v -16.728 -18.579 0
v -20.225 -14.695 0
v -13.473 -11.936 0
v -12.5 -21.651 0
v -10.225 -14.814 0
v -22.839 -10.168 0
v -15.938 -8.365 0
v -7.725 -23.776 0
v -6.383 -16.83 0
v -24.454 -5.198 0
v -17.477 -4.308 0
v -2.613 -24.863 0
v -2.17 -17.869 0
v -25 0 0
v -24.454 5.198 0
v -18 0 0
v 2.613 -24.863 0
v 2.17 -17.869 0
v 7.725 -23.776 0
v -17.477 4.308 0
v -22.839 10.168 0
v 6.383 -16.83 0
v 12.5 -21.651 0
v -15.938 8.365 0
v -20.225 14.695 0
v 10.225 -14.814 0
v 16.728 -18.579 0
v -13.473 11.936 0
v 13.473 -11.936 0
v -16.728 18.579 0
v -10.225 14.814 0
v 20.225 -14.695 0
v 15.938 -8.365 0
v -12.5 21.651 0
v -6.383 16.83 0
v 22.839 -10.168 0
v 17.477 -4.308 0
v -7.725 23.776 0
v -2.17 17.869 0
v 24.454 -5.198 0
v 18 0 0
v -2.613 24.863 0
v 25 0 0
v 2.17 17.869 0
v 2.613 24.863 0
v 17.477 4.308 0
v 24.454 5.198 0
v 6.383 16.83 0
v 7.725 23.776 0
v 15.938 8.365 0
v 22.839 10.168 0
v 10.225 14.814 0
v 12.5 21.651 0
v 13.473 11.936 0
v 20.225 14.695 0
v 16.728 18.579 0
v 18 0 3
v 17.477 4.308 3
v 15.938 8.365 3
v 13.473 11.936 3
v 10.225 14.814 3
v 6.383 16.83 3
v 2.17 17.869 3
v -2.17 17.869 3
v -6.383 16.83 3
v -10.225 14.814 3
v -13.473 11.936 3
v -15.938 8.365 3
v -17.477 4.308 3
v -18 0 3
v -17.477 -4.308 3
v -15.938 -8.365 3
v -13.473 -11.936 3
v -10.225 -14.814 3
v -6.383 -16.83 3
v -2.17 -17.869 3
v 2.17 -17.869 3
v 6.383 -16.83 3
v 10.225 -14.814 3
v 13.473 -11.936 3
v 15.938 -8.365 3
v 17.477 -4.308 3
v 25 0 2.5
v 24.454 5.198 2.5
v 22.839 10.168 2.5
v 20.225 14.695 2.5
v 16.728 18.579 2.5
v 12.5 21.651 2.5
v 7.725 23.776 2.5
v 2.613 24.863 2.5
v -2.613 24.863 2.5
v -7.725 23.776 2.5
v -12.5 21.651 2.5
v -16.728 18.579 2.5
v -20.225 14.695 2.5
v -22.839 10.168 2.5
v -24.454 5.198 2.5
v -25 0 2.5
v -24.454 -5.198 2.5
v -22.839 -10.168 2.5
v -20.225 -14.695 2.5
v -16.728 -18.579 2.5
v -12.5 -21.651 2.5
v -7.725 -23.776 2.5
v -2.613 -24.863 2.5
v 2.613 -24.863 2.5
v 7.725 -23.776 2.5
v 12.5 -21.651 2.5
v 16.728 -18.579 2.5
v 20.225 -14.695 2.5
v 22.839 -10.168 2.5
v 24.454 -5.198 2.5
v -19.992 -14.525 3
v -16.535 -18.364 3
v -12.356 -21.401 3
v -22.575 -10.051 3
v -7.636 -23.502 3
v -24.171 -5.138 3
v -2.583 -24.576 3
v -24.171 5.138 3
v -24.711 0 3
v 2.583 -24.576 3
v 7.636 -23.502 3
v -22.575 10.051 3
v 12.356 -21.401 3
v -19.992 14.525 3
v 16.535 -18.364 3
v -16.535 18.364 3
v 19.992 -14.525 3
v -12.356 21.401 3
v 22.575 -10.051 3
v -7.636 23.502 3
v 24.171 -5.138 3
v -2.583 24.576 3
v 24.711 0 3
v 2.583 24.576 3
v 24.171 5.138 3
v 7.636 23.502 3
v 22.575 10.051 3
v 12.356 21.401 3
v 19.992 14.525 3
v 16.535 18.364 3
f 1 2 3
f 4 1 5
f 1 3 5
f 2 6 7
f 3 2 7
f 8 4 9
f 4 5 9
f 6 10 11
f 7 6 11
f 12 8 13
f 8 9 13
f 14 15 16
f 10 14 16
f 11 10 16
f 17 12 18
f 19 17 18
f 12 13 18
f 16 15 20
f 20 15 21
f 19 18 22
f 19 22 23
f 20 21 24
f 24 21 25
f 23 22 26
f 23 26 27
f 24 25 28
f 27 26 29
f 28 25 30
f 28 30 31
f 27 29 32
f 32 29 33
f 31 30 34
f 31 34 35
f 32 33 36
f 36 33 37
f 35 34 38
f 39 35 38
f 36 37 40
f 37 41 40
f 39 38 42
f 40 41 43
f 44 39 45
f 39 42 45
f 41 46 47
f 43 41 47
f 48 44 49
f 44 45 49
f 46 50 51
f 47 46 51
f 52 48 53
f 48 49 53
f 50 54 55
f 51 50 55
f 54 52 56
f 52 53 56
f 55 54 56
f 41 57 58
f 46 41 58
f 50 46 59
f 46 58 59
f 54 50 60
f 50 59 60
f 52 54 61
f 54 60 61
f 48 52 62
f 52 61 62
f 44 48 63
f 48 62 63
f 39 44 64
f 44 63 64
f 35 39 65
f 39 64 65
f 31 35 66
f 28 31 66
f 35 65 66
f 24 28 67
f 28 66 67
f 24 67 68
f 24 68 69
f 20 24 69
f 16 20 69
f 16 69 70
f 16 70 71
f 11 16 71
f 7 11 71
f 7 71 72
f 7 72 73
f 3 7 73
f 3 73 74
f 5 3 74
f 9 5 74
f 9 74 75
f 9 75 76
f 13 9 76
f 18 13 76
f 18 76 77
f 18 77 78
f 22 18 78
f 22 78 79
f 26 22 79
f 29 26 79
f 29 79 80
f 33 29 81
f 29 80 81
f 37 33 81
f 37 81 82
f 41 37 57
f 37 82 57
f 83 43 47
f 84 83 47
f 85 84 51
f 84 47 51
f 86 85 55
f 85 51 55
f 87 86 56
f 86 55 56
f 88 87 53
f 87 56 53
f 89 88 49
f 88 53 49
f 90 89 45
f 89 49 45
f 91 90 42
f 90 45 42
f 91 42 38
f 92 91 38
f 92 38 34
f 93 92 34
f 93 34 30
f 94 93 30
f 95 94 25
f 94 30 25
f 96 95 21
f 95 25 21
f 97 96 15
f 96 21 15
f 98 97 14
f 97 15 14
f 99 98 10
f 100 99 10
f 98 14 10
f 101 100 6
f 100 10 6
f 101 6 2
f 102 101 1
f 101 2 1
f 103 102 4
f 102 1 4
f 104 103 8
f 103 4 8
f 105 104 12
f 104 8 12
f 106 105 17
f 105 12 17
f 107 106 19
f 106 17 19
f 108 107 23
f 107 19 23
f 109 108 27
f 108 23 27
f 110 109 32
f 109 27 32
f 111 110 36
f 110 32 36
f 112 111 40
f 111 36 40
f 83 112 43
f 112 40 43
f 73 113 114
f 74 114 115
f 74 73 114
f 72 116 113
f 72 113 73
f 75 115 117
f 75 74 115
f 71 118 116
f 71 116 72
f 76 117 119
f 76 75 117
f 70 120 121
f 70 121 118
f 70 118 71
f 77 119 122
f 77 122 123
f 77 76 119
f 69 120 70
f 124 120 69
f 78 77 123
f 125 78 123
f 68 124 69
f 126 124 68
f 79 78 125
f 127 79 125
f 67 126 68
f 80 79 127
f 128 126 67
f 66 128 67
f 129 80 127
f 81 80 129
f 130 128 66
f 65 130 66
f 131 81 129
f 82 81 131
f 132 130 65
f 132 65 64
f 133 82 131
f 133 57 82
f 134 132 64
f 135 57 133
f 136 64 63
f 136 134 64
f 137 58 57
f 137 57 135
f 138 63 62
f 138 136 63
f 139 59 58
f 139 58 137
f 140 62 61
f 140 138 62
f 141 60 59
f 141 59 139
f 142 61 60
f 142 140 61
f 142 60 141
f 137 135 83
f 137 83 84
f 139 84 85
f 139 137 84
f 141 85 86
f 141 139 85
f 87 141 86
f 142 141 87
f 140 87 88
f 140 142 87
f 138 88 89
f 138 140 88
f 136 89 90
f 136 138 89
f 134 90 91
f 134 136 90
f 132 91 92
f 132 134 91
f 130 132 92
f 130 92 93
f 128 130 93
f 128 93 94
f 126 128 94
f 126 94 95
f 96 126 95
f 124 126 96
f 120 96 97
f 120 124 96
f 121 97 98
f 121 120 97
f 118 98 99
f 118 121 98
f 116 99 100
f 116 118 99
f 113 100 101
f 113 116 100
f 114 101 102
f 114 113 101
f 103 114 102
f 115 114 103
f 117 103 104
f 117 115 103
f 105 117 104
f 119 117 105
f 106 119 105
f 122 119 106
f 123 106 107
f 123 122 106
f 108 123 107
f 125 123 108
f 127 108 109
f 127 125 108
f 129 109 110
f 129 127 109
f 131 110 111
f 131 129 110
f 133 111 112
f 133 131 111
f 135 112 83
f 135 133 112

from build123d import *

# Parameters (mm, degrees)
SKETCH_1_R          = 25
EXTRUDE_2_DEPTH     = 3
SKETCH_2_R          = 18
CUT_EXTRUDE_1_DEPTH = 36.482389998
CHAMFER_1_SIZE      = 0.5
CHAMFER_1_SIZE2     = 0.288675135


with BuildPart() as part:
    # 草图1 → 拉伸2 (new body)
    with BuildSketch(Plane.XY):
        Circle(SKETCH_1_R)
    extrude(amount=EXTRUDE_2_DEPTH)

    # 草图2 → 切除-拉伸1 (cut, through all)
    with BuildSketch(Plane.XY.offset(3)):
        Circle(SKETCH_2_R)
    extrude(amount=-CUT_EXTRUDE_1_DEPTH, mode=Mode.SUBTRACT)

    # 倒角1
    chamfer_1_edges = [part.edges().sort_by_distance(p)[0] for p in [
        (-25, 0, 3),
    ]]
    chamfer_1_side = [part.faces().sort_by_distance(p)[0] for p in [
        (-25, 0, 1.5),
    ]]
    chamfer(chamfer_1_edges, length=CHAMFER_1_SIZE, length2=CHAMFER_1_SIZE2, reference=chamfer_1_side[0])


solid = part.part
